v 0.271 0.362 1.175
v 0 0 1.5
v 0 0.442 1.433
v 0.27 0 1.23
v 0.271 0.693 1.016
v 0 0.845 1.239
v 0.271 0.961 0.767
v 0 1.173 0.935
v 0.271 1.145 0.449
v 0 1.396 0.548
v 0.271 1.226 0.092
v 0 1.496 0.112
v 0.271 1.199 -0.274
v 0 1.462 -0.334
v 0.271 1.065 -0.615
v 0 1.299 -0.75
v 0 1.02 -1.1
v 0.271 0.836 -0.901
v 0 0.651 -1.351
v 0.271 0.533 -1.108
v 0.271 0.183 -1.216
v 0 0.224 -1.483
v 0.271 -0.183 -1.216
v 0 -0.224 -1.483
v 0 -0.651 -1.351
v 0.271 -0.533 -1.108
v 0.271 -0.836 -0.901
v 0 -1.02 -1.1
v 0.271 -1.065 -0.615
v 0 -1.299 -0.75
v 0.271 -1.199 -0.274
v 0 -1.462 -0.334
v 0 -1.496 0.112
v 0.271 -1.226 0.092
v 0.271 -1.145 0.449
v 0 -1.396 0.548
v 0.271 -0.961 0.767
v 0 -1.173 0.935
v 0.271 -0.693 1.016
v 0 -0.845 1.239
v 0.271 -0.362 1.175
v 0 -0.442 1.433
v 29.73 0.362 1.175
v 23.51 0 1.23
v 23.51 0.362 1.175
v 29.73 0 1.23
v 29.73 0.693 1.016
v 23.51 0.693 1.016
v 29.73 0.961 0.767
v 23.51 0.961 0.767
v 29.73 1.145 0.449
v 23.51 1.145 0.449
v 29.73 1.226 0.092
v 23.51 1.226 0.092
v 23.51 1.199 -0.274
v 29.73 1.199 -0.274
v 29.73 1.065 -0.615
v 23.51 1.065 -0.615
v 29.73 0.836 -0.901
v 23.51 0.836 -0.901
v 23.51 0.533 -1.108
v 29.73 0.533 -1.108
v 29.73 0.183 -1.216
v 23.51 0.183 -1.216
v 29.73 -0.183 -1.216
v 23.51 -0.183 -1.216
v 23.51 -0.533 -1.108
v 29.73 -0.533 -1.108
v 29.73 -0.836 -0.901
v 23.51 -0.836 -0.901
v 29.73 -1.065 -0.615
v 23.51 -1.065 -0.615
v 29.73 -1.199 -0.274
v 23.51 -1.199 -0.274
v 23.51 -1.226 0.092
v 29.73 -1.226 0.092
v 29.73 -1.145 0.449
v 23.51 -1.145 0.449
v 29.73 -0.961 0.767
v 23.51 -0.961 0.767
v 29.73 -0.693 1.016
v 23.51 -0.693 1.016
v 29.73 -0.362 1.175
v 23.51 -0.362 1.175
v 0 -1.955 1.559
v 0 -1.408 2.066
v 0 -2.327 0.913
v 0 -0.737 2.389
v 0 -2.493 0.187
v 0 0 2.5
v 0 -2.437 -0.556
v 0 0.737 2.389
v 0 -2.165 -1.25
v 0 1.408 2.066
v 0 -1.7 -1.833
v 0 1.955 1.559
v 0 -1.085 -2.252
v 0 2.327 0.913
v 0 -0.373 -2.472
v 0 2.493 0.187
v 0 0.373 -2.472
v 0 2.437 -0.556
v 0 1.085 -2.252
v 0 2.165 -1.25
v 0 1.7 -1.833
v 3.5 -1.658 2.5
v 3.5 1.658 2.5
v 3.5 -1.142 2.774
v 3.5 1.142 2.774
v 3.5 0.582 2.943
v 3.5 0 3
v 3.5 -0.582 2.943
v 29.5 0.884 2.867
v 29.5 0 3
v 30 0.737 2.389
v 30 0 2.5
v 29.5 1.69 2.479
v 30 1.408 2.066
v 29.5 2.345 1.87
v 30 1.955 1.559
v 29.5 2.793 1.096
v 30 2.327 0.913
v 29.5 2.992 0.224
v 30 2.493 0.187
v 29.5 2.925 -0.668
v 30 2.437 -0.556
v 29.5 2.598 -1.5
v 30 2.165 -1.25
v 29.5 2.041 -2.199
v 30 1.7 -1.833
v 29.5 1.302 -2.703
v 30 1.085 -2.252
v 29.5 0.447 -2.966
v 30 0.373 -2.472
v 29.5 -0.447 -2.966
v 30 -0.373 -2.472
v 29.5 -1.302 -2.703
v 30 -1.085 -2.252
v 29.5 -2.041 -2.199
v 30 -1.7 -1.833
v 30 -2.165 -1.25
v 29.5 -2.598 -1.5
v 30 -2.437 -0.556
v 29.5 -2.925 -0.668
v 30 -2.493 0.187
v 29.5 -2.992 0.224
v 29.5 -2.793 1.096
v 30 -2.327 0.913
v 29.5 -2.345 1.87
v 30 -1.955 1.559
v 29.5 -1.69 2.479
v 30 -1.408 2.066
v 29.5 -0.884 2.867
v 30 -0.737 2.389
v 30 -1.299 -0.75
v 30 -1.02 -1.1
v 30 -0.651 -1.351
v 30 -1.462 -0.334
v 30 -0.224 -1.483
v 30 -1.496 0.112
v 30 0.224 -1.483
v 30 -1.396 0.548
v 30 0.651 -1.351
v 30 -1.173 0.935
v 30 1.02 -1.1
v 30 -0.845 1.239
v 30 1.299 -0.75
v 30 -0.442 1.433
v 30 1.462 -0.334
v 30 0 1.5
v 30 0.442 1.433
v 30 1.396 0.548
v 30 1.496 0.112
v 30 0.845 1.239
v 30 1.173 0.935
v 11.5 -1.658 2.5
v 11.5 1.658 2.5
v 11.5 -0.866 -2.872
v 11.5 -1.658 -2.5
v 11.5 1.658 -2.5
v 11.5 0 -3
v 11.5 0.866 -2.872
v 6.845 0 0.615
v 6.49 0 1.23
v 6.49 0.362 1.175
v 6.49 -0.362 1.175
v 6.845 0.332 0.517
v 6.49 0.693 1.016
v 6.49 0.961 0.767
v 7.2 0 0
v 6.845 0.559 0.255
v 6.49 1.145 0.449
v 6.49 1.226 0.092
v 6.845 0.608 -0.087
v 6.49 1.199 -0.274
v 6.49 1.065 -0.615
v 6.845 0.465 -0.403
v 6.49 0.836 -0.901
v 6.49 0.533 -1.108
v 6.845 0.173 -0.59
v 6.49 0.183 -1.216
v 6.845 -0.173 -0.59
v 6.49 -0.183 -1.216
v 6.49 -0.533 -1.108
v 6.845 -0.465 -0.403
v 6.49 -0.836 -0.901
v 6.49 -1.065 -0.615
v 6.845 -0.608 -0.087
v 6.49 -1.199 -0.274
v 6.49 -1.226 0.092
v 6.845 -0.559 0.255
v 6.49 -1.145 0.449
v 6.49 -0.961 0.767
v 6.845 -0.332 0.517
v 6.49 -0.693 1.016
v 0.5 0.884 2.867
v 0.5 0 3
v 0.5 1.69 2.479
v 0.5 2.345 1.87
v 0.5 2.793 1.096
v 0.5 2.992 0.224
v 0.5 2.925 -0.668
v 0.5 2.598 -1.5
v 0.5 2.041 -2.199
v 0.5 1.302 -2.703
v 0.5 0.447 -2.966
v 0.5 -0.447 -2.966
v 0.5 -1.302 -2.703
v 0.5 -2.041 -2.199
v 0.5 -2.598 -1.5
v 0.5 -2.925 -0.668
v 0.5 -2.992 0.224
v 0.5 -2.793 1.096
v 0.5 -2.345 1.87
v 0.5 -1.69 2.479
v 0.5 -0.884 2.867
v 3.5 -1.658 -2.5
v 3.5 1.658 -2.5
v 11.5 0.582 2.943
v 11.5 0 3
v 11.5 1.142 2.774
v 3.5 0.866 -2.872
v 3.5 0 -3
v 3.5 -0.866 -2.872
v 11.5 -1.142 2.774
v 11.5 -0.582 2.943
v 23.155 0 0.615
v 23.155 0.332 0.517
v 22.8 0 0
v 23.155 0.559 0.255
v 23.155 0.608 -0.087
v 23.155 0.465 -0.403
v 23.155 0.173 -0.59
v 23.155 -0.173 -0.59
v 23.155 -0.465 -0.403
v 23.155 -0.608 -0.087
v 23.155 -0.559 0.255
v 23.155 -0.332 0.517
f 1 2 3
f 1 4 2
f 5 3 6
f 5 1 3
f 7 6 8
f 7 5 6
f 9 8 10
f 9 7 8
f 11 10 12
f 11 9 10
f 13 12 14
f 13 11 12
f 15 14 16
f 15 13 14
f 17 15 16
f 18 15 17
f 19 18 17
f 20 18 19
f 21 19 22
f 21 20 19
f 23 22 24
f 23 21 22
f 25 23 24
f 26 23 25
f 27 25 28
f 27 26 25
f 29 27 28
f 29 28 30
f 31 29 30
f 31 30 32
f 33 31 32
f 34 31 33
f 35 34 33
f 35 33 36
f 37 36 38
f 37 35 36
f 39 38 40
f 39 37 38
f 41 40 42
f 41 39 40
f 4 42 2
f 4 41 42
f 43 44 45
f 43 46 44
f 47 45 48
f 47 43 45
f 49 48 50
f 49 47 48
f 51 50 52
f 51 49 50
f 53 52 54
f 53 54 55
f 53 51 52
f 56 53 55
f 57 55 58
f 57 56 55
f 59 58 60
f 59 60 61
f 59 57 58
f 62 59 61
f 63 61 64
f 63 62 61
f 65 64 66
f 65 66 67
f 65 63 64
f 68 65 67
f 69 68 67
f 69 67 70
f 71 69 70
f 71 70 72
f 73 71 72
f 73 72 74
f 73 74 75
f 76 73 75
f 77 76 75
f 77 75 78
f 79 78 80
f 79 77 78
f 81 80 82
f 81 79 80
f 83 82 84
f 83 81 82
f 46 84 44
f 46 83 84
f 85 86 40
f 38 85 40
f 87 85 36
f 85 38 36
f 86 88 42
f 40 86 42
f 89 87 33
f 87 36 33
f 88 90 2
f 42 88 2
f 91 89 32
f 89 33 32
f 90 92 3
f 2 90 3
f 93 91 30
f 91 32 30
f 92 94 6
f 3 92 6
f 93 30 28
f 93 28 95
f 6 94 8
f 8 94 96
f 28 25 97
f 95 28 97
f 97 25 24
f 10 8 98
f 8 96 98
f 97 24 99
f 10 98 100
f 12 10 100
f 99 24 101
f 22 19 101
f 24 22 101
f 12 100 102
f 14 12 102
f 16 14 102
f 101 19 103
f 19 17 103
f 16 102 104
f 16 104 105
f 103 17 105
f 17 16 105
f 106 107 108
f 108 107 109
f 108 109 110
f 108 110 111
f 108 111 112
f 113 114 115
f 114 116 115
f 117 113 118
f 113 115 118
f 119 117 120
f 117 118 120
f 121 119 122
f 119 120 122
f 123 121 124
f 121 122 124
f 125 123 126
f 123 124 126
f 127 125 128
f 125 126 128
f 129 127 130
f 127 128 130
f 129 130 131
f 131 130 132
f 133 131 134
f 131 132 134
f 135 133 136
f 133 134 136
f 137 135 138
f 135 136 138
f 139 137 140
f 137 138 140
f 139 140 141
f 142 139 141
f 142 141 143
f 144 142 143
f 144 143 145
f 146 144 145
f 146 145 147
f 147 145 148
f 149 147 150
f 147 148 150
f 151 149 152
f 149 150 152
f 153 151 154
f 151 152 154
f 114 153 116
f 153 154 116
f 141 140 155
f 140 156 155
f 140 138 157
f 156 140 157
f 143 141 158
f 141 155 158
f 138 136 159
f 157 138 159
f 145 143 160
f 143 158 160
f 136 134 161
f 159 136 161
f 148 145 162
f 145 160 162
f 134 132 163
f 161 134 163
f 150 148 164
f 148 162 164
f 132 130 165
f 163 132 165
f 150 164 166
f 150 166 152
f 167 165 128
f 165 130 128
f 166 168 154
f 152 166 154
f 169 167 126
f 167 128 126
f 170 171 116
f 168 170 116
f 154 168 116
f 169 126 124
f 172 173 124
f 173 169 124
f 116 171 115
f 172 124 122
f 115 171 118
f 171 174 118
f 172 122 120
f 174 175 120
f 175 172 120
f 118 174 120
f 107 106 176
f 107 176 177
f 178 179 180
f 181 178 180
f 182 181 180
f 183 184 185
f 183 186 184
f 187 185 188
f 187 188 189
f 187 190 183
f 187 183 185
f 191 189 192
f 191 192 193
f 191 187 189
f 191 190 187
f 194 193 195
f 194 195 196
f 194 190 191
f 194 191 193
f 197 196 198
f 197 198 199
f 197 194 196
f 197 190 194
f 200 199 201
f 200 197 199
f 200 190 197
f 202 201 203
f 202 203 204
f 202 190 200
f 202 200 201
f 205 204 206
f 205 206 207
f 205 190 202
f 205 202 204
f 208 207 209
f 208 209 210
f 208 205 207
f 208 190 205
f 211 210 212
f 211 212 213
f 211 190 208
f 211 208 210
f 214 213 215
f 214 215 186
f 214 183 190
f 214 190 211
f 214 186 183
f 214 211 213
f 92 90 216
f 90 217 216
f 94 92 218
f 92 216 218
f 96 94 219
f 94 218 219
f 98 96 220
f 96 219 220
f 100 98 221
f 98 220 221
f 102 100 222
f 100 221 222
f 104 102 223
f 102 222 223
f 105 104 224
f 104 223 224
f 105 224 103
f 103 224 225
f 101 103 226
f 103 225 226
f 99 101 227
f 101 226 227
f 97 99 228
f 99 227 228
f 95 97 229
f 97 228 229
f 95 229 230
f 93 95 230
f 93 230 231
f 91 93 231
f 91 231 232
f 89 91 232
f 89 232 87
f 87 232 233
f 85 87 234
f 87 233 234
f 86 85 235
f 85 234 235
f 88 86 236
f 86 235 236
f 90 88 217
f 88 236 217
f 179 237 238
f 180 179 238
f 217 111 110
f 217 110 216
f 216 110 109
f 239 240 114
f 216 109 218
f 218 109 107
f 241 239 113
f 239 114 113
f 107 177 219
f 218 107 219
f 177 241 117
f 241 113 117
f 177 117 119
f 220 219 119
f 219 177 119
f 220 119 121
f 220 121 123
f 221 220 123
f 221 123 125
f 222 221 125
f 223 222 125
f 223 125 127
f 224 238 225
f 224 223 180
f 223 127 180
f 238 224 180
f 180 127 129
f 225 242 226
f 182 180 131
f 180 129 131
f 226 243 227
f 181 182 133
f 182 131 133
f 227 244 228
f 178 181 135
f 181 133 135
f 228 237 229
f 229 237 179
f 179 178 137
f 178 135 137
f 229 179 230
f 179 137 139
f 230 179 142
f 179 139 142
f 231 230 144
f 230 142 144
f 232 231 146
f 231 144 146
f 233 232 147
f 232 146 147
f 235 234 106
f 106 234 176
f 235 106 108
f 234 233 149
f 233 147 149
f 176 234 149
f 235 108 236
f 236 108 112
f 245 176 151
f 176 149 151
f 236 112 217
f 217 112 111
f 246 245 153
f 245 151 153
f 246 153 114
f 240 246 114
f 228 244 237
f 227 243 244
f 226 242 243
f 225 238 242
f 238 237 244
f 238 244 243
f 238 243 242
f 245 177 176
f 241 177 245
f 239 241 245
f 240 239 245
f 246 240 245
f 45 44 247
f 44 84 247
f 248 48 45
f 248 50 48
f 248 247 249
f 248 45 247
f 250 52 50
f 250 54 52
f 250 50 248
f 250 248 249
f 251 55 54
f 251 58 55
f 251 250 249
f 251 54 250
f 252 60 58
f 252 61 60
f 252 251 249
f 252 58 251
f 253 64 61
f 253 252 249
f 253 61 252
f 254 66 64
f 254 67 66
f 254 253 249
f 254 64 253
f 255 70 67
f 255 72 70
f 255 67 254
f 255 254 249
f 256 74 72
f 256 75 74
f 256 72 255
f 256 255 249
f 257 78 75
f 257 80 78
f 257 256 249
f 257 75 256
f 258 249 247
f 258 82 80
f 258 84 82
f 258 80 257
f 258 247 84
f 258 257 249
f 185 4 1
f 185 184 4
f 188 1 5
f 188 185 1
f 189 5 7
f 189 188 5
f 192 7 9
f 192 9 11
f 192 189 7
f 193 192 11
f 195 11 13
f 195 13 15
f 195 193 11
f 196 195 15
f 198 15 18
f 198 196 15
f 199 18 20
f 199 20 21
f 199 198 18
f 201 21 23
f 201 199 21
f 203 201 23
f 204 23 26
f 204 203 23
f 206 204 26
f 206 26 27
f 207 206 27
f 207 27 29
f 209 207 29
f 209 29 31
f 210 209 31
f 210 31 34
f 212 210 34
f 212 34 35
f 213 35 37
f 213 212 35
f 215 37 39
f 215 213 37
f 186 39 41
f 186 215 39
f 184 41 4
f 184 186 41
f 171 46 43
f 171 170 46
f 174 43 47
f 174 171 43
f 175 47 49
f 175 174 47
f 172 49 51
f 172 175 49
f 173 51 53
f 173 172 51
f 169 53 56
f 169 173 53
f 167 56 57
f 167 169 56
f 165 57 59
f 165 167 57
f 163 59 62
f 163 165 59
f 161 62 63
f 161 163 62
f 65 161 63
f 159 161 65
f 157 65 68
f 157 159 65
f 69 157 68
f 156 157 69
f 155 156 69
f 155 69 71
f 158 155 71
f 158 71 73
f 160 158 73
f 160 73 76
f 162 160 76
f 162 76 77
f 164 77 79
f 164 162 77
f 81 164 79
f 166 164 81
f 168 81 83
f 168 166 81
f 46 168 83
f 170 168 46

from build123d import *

# Parameters (mm, degrees)
SKETCH4_W          = 10
SKETCH4_H          = 24
SKETCH4_W_2        = 5
SKETCH4_H_2        = 12
CUT_EXTRUDE1_DEPTH = 8


with BuildPart() as part:
    # Sketch1 → Revolve1 (revolve)
    with BuildSketch(Plane.XY, mode=Mode.PRIVATE) as revolve1_sk:
        Polygon((0, 0), (0, 2.5), (0.5, 3), (29.5, 3), (30, 2.5), (30, 0), align=None)
    revolve(revolve1_sk.sketch.rotate(Axis((30, 0, 0), (-1, 0, 0)), 270), axis=Axis((30, 0, 0), (-1, 0, 0)))

    # Sketch2 → Cut-Revolve1 (revolve, cut)
    with BuildSketch(Plane.XY, mode=Mode.PRIVATE) as cut_revolve1_sk:
        Polygon((0, 0), (0, 1.5), (0.2705, 1.2295), (6.490147844, 1.2295), (7.2, 0), align=None)
    revolve(cut_revolve1_sk.sketch.rotate(Axis((7.2, 0, 0), (-1, 0, 0)), 270), axis=Axis((7.2, 0, 0), (-1, 0, 0)), mode=Mode.SUBTRACT)

    # Sketch3 → Cut-Revolve2 (revolve, cut)
    with BuildSketch(Plane.XY, mode=Mode.PRIVATE) as cut_revolve2_sk:
        Polygon((22.8, 0), (23.509852156, 1.2295), (29.7295, 1.2295), (30, 1.5), (30, 0), align=None)
    revolve(cut_revolve2_sk.sketch.rotate(Axis((30, 0, 0), (-1, 0, 0)), 270), axis=Axis((30, 0, 0), (-1, 0, 0)), mode=Mode.SUBTRACT)

    # Sketch4 → Cut-Extrude1 (cut)
    with BuildSketch(Plane(origin=(3.5, 0, 0), x_dir=(0, 0, -1), z_dir=(1, 0, 0))):
        Rectangle(SKETCH4_W, SKETCH4_H)
        Rectangle(SKETCH4_W_2, SKETCH4_H_2, mode=Mode.SUBTRACT)
    extrude(amount=CUT_EXTRUDE1_DEPTH, mode=Mode.SUBTRACT)


solid = part.part
